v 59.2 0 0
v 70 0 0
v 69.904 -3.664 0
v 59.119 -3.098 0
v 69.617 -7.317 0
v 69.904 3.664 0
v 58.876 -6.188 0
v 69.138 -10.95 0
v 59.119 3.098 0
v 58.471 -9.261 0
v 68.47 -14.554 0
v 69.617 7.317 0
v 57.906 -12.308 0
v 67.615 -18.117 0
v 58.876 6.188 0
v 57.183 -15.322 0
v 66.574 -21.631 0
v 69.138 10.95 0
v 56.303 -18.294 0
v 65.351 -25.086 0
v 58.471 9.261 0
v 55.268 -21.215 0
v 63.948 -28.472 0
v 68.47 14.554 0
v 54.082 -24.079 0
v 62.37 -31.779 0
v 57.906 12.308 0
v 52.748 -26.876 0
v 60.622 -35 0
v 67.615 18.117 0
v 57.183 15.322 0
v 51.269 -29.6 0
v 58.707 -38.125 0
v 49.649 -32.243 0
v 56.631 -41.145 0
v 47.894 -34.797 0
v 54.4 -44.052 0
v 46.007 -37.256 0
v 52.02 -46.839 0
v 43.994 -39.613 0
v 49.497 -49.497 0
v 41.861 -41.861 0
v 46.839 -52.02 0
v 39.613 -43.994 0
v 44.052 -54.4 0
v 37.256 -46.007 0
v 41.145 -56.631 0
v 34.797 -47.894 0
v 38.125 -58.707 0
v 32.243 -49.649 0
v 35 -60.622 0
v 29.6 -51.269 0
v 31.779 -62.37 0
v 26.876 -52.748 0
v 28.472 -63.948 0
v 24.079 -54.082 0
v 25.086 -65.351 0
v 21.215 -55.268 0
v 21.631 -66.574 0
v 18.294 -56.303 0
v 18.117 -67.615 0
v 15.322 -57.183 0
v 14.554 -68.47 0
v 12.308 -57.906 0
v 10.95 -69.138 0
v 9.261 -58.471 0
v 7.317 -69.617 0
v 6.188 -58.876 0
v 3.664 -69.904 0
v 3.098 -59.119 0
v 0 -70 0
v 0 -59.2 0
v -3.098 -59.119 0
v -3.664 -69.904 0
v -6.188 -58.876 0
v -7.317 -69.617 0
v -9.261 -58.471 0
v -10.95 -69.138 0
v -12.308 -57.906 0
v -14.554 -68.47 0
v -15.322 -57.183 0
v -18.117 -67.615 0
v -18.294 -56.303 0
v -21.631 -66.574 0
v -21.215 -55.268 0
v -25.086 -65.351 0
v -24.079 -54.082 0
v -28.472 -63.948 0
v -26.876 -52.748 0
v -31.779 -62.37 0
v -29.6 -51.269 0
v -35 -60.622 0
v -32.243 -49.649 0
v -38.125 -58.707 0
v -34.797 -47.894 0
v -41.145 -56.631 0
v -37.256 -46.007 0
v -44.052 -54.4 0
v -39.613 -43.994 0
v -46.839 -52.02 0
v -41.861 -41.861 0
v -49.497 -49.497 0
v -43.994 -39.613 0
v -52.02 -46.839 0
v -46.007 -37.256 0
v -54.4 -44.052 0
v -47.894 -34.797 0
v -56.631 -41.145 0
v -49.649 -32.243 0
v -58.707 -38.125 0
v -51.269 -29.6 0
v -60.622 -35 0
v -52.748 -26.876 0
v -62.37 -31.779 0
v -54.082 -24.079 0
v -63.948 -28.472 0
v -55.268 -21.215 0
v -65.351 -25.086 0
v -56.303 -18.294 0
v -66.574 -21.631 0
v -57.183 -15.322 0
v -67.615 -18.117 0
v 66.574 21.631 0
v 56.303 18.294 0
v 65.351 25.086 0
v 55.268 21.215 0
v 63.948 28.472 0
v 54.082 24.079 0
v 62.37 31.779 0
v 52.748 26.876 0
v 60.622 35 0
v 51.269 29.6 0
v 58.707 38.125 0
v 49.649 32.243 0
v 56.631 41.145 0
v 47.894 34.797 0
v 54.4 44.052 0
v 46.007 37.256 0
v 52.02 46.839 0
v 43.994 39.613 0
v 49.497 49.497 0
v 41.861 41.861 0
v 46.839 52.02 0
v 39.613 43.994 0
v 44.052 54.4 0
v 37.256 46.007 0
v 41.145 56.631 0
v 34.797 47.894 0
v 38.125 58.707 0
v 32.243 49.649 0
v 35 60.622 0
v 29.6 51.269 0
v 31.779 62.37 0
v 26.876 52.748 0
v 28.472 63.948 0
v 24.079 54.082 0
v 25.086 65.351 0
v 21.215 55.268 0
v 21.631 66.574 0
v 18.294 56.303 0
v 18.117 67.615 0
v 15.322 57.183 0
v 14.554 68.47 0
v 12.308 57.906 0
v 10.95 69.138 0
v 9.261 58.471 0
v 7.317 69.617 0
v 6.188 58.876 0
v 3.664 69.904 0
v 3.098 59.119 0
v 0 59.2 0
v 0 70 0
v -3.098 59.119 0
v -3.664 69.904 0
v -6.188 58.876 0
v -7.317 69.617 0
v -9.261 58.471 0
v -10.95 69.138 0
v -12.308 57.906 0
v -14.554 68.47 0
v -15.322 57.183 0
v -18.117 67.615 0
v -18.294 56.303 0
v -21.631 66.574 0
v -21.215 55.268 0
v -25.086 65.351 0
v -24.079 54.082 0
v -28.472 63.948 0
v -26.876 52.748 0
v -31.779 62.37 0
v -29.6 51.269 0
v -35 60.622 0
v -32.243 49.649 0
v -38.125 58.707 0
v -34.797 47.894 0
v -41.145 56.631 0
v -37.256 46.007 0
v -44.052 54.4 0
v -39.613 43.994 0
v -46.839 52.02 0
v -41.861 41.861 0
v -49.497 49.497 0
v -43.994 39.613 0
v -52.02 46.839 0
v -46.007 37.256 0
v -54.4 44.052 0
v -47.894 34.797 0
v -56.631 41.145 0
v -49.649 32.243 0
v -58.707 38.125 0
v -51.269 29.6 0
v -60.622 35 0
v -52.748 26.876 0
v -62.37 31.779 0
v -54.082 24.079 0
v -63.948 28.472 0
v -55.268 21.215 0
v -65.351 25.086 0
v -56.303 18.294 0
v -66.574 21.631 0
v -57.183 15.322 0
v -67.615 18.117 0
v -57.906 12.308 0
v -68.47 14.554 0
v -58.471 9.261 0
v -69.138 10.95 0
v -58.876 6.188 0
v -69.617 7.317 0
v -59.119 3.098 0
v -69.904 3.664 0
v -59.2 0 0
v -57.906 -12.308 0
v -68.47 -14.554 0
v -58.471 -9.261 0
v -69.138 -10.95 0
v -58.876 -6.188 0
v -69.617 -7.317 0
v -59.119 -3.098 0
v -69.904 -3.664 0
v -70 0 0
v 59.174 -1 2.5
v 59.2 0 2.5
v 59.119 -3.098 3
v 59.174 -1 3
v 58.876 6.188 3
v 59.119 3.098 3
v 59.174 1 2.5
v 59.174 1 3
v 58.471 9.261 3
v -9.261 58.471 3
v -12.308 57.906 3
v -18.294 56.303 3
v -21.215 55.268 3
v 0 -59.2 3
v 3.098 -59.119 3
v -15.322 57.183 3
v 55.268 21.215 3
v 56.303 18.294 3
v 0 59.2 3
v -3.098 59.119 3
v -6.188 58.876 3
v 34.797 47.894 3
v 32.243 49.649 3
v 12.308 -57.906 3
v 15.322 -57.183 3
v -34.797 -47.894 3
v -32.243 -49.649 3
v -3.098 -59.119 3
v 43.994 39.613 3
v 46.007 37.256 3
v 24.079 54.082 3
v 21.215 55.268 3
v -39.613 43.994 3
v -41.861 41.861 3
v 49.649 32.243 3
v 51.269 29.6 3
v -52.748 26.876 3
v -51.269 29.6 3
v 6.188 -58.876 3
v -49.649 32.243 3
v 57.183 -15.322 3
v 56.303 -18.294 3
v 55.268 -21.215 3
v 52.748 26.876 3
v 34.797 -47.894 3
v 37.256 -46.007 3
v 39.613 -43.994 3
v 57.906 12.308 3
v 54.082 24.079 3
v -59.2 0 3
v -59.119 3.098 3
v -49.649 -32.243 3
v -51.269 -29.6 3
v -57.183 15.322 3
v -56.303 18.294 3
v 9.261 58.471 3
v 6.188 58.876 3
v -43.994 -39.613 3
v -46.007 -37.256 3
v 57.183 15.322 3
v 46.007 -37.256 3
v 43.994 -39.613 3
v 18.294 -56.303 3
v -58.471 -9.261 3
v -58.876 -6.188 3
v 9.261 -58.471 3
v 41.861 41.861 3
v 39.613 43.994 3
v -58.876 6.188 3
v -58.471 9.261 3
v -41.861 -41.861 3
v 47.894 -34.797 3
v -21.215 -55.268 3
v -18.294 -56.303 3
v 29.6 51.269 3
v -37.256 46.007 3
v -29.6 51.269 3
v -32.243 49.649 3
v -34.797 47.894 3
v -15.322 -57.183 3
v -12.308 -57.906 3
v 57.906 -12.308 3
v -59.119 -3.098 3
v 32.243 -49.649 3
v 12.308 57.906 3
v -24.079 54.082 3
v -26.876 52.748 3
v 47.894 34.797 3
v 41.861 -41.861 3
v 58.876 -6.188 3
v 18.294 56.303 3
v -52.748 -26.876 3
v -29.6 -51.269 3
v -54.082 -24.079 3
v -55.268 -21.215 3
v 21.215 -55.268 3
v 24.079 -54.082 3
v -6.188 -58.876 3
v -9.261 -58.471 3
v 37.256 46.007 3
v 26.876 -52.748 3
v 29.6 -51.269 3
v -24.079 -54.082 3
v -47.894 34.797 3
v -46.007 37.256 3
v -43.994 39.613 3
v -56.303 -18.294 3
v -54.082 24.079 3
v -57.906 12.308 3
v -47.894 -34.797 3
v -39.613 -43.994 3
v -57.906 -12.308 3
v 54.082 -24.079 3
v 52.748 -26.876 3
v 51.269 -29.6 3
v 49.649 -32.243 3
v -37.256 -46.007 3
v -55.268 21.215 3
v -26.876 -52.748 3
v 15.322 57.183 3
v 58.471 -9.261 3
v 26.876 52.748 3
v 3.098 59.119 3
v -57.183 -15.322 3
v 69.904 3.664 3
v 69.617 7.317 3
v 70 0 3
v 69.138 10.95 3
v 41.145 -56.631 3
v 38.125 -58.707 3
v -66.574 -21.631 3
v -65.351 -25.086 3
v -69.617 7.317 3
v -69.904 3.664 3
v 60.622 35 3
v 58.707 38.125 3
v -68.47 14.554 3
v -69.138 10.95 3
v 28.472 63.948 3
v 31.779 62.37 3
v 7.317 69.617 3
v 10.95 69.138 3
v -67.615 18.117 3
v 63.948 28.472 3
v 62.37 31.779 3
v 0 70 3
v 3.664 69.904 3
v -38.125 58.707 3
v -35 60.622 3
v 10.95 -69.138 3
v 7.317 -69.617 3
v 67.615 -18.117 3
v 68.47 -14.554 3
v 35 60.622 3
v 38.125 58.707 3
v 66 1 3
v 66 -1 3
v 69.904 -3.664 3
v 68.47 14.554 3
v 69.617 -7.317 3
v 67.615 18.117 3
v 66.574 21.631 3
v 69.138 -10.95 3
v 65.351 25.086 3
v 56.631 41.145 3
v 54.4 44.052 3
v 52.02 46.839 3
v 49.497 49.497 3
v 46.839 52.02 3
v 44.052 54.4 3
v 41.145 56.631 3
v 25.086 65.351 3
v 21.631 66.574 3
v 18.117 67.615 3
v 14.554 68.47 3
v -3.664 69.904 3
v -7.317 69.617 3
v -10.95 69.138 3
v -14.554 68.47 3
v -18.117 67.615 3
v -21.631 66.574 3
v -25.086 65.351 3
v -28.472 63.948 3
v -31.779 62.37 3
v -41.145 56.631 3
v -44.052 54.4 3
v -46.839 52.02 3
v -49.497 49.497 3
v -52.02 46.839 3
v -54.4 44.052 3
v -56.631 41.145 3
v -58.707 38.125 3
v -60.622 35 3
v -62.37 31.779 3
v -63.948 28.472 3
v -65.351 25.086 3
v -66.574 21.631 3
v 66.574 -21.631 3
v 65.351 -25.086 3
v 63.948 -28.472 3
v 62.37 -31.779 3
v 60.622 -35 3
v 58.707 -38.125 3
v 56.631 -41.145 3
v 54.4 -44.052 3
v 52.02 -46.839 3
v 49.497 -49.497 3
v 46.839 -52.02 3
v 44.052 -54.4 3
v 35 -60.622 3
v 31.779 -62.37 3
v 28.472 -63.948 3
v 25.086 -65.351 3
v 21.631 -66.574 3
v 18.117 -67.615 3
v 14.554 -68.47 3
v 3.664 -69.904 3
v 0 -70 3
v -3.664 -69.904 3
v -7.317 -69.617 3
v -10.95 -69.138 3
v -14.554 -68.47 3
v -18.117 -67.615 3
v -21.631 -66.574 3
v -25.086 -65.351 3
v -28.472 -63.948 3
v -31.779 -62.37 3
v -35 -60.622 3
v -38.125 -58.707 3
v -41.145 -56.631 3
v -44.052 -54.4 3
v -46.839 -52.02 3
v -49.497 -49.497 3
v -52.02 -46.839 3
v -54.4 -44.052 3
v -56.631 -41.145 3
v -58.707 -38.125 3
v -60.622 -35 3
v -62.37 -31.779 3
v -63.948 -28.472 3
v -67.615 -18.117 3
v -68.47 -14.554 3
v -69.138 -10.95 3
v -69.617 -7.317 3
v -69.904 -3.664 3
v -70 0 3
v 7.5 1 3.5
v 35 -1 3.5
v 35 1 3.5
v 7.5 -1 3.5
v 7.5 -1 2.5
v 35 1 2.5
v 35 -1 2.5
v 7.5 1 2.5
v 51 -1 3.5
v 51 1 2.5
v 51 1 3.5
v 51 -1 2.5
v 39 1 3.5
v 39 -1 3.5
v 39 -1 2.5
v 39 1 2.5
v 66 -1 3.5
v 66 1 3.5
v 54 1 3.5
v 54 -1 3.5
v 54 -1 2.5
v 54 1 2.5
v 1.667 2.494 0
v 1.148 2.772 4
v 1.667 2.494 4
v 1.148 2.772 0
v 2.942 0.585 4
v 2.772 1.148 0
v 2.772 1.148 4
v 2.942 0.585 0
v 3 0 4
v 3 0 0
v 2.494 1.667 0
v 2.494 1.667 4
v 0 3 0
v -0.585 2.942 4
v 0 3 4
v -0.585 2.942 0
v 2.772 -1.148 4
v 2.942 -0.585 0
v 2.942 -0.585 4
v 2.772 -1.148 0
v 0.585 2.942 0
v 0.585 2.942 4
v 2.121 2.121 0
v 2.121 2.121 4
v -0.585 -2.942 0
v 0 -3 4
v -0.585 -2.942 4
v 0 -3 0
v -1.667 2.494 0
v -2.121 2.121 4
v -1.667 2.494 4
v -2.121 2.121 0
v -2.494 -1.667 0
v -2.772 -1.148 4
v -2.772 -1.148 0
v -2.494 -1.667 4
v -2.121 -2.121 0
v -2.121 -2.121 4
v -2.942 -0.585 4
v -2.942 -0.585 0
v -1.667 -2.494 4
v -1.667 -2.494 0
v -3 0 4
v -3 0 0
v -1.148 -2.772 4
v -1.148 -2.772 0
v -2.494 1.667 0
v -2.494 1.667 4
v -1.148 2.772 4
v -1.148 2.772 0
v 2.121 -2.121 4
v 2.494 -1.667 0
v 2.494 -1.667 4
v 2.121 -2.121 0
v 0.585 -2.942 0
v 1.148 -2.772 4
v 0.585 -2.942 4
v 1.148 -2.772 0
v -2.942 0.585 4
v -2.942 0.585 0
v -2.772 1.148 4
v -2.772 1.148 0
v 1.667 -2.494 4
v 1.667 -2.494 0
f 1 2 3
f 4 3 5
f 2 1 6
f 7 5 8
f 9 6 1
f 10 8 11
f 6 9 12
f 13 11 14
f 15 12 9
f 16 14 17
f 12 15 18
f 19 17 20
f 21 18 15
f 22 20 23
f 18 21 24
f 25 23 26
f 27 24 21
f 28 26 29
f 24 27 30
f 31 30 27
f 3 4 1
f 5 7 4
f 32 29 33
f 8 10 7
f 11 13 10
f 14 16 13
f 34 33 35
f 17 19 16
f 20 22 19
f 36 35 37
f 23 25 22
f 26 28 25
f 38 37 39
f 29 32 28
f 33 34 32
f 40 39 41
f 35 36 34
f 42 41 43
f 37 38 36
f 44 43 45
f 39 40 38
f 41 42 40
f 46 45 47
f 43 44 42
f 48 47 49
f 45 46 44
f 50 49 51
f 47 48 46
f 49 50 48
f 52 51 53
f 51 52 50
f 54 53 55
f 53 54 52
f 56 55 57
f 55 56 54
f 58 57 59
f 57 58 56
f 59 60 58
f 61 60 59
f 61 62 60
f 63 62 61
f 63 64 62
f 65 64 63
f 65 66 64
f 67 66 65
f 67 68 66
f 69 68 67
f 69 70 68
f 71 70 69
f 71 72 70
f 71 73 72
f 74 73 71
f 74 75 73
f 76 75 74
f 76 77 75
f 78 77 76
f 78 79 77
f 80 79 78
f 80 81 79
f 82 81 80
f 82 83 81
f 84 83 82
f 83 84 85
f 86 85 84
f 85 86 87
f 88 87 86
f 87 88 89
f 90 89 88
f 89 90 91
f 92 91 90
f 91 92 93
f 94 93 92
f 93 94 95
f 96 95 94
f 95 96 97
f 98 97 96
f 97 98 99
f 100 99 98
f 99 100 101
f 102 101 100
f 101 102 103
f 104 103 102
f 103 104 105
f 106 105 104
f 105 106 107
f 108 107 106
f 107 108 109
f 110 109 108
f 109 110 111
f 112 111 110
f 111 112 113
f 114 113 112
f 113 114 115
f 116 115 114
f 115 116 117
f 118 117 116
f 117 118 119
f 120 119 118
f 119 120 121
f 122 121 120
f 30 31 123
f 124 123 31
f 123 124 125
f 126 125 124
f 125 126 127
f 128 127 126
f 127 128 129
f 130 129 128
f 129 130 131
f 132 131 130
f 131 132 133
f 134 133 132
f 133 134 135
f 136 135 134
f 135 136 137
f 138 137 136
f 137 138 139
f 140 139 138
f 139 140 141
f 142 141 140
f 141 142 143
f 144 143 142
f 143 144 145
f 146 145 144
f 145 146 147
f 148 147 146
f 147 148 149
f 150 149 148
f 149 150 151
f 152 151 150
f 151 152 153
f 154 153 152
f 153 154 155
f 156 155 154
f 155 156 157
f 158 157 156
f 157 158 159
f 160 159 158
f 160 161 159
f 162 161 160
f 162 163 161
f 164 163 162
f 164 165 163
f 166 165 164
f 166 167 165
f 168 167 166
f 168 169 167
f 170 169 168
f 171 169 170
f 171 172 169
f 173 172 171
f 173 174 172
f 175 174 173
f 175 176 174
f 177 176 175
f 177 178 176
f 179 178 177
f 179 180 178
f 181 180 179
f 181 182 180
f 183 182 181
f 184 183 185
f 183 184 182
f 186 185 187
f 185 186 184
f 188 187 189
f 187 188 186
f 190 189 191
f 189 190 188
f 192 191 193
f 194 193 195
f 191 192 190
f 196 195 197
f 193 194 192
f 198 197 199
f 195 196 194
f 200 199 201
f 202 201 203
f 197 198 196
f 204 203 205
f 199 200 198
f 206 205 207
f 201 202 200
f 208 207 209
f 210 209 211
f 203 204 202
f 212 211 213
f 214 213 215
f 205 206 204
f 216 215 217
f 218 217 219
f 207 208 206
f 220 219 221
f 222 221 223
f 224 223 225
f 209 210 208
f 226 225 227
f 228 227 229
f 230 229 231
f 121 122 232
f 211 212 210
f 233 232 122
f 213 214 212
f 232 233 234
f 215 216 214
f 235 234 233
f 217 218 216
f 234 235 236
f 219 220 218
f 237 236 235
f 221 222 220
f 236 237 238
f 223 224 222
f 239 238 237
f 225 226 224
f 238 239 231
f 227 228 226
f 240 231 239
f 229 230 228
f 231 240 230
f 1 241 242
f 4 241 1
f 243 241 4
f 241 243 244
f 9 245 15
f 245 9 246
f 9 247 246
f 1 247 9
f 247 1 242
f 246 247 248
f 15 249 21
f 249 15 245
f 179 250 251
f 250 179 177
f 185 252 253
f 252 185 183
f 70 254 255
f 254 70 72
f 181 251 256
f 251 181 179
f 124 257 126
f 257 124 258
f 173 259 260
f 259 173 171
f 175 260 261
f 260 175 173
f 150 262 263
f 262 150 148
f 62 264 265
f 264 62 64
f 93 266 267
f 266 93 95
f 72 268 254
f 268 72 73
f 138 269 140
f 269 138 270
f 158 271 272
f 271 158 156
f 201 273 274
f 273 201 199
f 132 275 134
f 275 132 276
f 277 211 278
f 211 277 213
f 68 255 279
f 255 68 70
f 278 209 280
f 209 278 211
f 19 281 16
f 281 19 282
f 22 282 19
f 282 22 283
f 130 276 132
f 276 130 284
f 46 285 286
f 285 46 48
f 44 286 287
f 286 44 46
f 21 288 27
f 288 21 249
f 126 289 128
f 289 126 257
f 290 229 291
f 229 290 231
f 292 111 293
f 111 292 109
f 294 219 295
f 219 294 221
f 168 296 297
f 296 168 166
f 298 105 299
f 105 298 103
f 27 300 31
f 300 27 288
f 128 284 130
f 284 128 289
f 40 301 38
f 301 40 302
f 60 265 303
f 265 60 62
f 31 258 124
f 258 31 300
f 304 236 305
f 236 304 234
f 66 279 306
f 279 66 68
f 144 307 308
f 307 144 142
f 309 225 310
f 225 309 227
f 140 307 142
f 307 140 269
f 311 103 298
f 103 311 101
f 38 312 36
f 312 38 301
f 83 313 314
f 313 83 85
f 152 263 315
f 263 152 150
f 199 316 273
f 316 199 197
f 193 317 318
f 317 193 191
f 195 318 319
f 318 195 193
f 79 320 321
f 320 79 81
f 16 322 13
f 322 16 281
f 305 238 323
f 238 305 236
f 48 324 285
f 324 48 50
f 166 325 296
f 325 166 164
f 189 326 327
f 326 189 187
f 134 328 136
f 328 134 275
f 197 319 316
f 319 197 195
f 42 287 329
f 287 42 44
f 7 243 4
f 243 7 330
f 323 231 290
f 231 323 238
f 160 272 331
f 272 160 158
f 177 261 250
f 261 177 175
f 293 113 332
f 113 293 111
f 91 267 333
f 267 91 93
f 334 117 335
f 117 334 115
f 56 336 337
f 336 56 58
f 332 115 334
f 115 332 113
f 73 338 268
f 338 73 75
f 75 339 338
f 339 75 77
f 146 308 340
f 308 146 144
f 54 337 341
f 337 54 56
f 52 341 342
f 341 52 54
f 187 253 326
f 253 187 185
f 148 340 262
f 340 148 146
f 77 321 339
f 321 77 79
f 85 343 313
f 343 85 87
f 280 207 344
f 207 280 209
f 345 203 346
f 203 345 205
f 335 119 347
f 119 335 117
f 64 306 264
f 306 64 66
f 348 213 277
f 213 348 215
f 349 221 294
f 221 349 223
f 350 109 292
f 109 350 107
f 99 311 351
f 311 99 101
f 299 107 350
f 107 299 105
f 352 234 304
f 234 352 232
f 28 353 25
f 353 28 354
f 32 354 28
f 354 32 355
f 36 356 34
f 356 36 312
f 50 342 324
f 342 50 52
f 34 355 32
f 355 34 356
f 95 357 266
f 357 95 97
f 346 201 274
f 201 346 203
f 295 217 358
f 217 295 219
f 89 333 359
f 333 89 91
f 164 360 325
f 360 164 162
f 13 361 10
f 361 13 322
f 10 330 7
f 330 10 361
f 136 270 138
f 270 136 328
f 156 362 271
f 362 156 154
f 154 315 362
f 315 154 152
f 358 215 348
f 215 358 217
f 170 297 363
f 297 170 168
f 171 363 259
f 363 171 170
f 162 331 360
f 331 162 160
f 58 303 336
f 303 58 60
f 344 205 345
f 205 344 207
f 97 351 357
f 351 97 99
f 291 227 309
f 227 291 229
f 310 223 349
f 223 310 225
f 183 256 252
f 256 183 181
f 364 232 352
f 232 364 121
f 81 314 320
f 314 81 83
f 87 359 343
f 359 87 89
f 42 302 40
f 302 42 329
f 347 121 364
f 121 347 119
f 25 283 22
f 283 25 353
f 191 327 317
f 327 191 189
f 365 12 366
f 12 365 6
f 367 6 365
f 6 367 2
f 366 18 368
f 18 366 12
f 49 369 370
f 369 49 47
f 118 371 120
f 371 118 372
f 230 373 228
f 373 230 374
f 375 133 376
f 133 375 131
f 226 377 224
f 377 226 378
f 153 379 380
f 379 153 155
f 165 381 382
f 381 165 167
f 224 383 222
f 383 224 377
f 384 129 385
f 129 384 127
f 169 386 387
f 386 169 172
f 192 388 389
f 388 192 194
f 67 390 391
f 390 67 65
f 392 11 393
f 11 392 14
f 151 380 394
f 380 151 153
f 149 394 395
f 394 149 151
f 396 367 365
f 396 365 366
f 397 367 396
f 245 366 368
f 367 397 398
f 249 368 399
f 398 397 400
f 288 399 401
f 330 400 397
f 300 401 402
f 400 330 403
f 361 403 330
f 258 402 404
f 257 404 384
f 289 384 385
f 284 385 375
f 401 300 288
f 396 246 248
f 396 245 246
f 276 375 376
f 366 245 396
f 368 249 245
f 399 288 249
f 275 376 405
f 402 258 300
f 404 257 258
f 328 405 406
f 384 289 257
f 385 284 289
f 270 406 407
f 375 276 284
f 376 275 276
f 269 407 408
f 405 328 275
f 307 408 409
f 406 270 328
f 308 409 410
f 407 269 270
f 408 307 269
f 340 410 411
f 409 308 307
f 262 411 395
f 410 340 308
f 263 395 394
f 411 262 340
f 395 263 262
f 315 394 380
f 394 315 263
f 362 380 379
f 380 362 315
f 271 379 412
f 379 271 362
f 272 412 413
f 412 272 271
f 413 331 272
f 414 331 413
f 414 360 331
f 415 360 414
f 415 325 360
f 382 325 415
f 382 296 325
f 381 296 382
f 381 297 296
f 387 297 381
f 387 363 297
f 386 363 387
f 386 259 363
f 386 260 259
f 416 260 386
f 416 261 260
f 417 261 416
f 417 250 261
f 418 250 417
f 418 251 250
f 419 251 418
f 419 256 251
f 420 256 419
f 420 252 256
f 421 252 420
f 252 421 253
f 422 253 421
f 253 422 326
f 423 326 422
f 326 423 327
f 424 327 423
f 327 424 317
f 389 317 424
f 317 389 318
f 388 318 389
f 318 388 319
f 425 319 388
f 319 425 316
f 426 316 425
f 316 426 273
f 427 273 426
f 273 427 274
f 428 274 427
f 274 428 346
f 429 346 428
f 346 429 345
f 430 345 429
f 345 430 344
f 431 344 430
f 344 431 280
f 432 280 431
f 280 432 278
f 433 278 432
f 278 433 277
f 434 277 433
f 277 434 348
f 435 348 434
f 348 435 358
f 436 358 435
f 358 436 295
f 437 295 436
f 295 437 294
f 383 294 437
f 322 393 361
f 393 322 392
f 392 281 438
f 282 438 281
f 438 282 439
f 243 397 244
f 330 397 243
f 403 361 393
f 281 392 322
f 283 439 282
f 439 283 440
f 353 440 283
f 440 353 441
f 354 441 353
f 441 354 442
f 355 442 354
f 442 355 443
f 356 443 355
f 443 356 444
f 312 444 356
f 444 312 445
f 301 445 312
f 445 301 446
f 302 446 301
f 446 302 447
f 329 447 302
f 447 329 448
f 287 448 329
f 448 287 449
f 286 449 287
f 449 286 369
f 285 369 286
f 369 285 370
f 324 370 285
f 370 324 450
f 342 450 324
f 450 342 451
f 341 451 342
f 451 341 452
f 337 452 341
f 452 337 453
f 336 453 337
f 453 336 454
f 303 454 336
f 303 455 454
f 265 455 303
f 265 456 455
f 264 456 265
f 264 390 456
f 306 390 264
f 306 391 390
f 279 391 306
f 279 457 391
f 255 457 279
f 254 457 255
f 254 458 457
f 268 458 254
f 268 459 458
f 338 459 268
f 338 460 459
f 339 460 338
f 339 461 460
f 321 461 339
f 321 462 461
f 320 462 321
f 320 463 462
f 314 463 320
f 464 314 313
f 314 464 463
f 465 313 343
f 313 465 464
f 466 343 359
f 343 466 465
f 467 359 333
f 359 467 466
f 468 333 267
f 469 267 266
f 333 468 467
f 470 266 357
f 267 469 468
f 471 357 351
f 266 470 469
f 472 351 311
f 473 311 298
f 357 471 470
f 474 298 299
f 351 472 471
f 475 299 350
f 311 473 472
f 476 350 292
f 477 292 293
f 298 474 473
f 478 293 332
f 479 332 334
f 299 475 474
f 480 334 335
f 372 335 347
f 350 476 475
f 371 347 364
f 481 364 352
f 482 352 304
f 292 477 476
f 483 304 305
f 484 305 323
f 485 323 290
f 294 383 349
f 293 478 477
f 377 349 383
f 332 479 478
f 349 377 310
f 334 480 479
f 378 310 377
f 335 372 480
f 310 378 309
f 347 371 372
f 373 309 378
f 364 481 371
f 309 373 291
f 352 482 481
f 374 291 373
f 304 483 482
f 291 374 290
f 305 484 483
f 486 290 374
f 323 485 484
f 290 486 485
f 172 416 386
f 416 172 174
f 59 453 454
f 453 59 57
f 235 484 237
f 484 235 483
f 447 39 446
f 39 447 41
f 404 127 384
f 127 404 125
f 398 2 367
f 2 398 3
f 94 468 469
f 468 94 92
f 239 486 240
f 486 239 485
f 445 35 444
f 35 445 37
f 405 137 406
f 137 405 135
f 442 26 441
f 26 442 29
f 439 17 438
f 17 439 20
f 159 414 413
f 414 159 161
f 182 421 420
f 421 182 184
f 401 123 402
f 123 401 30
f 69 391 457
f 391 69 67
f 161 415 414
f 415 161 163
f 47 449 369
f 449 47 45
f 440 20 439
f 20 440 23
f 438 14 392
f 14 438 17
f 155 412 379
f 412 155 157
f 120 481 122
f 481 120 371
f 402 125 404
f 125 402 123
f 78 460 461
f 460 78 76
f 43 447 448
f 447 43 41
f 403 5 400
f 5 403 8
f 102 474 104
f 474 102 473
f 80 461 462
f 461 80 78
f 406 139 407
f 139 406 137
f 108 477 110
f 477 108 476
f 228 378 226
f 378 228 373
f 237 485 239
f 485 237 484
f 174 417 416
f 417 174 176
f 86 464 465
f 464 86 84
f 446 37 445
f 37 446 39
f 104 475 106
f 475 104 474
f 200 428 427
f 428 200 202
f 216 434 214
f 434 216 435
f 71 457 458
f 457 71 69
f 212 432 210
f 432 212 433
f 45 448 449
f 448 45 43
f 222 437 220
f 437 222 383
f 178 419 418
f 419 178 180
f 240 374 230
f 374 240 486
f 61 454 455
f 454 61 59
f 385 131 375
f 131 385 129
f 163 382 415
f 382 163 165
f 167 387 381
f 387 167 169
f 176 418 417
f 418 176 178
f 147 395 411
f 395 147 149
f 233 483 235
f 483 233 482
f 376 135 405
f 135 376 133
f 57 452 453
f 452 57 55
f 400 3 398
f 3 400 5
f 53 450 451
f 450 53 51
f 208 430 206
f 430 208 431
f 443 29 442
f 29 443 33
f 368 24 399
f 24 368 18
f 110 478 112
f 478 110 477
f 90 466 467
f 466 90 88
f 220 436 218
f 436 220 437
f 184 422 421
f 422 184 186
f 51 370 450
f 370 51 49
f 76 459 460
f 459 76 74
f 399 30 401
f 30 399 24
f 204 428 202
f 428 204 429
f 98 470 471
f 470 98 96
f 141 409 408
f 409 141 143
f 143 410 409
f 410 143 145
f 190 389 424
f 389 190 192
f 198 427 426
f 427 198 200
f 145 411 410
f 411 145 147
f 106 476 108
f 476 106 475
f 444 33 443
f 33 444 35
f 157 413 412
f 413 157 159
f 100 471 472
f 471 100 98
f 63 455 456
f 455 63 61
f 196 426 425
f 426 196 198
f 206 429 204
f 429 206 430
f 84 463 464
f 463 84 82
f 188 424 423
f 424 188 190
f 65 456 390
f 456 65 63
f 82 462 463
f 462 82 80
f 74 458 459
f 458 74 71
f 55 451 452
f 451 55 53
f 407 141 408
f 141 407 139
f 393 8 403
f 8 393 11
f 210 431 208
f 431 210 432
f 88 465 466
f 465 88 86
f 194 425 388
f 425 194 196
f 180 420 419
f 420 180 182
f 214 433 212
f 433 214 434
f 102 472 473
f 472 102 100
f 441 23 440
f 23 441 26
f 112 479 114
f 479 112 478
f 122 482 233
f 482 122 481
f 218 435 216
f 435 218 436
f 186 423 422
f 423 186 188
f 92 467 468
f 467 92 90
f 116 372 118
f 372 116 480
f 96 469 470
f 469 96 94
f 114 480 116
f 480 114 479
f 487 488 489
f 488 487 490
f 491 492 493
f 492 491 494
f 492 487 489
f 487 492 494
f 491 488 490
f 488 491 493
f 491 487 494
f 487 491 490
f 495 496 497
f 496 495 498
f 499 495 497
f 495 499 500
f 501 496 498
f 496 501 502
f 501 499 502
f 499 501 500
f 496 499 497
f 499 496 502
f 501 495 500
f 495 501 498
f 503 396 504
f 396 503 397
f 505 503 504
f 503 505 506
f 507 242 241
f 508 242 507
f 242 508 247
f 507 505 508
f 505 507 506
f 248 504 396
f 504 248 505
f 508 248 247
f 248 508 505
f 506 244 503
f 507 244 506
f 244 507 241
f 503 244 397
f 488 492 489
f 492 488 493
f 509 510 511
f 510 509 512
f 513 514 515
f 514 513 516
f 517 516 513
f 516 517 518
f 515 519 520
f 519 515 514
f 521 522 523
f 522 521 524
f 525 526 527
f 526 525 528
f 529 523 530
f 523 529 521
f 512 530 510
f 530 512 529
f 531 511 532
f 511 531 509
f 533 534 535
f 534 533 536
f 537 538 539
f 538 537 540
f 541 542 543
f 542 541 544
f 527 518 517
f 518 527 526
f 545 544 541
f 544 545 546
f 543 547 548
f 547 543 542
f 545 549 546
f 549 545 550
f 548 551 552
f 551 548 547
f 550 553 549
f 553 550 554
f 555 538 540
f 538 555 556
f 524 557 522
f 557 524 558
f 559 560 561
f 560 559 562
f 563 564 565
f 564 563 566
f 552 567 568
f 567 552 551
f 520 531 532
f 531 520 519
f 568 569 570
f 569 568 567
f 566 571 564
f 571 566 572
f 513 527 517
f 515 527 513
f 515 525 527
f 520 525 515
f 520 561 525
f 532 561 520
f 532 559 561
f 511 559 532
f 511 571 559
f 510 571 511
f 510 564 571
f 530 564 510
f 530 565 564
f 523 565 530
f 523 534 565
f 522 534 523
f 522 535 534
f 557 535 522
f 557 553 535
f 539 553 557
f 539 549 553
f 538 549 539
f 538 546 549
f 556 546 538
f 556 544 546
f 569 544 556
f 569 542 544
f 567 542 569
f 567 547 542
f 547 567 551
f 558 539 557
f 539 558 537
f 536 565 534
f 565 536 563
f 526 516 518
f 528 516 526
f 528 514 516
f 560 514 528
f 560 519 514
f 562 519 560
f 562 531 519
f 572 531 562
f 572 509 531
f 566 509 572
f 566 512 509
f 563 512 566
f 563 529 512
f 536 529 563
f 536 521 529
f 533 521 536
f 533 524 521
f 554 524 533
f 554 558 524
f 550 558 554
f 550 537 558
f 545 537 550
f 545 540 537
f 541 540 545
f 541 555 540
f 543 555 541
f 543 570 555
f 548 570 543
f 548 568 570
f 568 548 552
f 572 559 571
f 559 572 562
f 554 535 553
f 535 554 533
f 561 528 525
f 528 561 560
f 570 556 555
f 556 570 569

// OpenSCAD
// file: ../common/ticks.scad
module linear_ticks_2d(length=100, spacing=10, tick_len=4, tick_width=1){
    for (x=[0:spacing:length])
        translate([x,-tick_len/2]) square([tick_width,tick_len]);
}

module radial_ticks(radius=50, spacing_deg=15, tick_len=4, tick_width=1){
    for (a=[0:spacing_deg:359])
        rotate(a) translate([radius-tick_len, -tick_width/2]) square([tick_len,tick_width]);
}
// main file
/*
Title: Circular Motion Disk
Folder: 07_circular_motion
Physics Topic: Uniform circular motion
Difficulty: Beginner-Intermediate
Print Type: FDM, single material
Teaches: Conceptual mechanics
Use Case: Classroom manipulative
*/


use <../common/ticks.scad>;

// --------------------
// Parameters
// --------------------
disk_radius = 70;
disk_thickness = 3;
orbit_radii = [25,45,60];

module direction_marker(r=45){
    // tangential marker
    translate([r,0,disk_thickness]) cube([12,2,1],center=true);
    // centripetal marker
    translate([r/2,0,disk_thickness]) cube([10,2,1],center=true);
}

module circular_motion_disk(){
    difference(){
        cylinder(h=disk_thickness,r=disk_radius,$fn=120);
        for(r=orbit_radii) cylinder(h=disk_thickness+0.1,r=r-0.8,$fn=120);
    }
    radial_ticks(radius=disk_radius-5, spacing_deg=30, tick_len=4);
    for(r=orbit_radii) direction_marker(r);
    cylinder(h=disk_thickness+1,d=6,$fn=32);
}

// --------------------
// Physics Meaning
// --------------------
// Velocity is tangent; acceleration points inward toward center.

// --------------------
// Learning Notes
// --------------------
// Rotate a token around a ring and keep pointing acceleration inward.

// --------------------
// Print Notes
// --------------------
// Large flat print; use brim if needed for edge adhesion.

// --------------------
// Customization Ideas
// --------------------
// Add more orbit_radii for comparison exercises.

circular_motion_disk();
